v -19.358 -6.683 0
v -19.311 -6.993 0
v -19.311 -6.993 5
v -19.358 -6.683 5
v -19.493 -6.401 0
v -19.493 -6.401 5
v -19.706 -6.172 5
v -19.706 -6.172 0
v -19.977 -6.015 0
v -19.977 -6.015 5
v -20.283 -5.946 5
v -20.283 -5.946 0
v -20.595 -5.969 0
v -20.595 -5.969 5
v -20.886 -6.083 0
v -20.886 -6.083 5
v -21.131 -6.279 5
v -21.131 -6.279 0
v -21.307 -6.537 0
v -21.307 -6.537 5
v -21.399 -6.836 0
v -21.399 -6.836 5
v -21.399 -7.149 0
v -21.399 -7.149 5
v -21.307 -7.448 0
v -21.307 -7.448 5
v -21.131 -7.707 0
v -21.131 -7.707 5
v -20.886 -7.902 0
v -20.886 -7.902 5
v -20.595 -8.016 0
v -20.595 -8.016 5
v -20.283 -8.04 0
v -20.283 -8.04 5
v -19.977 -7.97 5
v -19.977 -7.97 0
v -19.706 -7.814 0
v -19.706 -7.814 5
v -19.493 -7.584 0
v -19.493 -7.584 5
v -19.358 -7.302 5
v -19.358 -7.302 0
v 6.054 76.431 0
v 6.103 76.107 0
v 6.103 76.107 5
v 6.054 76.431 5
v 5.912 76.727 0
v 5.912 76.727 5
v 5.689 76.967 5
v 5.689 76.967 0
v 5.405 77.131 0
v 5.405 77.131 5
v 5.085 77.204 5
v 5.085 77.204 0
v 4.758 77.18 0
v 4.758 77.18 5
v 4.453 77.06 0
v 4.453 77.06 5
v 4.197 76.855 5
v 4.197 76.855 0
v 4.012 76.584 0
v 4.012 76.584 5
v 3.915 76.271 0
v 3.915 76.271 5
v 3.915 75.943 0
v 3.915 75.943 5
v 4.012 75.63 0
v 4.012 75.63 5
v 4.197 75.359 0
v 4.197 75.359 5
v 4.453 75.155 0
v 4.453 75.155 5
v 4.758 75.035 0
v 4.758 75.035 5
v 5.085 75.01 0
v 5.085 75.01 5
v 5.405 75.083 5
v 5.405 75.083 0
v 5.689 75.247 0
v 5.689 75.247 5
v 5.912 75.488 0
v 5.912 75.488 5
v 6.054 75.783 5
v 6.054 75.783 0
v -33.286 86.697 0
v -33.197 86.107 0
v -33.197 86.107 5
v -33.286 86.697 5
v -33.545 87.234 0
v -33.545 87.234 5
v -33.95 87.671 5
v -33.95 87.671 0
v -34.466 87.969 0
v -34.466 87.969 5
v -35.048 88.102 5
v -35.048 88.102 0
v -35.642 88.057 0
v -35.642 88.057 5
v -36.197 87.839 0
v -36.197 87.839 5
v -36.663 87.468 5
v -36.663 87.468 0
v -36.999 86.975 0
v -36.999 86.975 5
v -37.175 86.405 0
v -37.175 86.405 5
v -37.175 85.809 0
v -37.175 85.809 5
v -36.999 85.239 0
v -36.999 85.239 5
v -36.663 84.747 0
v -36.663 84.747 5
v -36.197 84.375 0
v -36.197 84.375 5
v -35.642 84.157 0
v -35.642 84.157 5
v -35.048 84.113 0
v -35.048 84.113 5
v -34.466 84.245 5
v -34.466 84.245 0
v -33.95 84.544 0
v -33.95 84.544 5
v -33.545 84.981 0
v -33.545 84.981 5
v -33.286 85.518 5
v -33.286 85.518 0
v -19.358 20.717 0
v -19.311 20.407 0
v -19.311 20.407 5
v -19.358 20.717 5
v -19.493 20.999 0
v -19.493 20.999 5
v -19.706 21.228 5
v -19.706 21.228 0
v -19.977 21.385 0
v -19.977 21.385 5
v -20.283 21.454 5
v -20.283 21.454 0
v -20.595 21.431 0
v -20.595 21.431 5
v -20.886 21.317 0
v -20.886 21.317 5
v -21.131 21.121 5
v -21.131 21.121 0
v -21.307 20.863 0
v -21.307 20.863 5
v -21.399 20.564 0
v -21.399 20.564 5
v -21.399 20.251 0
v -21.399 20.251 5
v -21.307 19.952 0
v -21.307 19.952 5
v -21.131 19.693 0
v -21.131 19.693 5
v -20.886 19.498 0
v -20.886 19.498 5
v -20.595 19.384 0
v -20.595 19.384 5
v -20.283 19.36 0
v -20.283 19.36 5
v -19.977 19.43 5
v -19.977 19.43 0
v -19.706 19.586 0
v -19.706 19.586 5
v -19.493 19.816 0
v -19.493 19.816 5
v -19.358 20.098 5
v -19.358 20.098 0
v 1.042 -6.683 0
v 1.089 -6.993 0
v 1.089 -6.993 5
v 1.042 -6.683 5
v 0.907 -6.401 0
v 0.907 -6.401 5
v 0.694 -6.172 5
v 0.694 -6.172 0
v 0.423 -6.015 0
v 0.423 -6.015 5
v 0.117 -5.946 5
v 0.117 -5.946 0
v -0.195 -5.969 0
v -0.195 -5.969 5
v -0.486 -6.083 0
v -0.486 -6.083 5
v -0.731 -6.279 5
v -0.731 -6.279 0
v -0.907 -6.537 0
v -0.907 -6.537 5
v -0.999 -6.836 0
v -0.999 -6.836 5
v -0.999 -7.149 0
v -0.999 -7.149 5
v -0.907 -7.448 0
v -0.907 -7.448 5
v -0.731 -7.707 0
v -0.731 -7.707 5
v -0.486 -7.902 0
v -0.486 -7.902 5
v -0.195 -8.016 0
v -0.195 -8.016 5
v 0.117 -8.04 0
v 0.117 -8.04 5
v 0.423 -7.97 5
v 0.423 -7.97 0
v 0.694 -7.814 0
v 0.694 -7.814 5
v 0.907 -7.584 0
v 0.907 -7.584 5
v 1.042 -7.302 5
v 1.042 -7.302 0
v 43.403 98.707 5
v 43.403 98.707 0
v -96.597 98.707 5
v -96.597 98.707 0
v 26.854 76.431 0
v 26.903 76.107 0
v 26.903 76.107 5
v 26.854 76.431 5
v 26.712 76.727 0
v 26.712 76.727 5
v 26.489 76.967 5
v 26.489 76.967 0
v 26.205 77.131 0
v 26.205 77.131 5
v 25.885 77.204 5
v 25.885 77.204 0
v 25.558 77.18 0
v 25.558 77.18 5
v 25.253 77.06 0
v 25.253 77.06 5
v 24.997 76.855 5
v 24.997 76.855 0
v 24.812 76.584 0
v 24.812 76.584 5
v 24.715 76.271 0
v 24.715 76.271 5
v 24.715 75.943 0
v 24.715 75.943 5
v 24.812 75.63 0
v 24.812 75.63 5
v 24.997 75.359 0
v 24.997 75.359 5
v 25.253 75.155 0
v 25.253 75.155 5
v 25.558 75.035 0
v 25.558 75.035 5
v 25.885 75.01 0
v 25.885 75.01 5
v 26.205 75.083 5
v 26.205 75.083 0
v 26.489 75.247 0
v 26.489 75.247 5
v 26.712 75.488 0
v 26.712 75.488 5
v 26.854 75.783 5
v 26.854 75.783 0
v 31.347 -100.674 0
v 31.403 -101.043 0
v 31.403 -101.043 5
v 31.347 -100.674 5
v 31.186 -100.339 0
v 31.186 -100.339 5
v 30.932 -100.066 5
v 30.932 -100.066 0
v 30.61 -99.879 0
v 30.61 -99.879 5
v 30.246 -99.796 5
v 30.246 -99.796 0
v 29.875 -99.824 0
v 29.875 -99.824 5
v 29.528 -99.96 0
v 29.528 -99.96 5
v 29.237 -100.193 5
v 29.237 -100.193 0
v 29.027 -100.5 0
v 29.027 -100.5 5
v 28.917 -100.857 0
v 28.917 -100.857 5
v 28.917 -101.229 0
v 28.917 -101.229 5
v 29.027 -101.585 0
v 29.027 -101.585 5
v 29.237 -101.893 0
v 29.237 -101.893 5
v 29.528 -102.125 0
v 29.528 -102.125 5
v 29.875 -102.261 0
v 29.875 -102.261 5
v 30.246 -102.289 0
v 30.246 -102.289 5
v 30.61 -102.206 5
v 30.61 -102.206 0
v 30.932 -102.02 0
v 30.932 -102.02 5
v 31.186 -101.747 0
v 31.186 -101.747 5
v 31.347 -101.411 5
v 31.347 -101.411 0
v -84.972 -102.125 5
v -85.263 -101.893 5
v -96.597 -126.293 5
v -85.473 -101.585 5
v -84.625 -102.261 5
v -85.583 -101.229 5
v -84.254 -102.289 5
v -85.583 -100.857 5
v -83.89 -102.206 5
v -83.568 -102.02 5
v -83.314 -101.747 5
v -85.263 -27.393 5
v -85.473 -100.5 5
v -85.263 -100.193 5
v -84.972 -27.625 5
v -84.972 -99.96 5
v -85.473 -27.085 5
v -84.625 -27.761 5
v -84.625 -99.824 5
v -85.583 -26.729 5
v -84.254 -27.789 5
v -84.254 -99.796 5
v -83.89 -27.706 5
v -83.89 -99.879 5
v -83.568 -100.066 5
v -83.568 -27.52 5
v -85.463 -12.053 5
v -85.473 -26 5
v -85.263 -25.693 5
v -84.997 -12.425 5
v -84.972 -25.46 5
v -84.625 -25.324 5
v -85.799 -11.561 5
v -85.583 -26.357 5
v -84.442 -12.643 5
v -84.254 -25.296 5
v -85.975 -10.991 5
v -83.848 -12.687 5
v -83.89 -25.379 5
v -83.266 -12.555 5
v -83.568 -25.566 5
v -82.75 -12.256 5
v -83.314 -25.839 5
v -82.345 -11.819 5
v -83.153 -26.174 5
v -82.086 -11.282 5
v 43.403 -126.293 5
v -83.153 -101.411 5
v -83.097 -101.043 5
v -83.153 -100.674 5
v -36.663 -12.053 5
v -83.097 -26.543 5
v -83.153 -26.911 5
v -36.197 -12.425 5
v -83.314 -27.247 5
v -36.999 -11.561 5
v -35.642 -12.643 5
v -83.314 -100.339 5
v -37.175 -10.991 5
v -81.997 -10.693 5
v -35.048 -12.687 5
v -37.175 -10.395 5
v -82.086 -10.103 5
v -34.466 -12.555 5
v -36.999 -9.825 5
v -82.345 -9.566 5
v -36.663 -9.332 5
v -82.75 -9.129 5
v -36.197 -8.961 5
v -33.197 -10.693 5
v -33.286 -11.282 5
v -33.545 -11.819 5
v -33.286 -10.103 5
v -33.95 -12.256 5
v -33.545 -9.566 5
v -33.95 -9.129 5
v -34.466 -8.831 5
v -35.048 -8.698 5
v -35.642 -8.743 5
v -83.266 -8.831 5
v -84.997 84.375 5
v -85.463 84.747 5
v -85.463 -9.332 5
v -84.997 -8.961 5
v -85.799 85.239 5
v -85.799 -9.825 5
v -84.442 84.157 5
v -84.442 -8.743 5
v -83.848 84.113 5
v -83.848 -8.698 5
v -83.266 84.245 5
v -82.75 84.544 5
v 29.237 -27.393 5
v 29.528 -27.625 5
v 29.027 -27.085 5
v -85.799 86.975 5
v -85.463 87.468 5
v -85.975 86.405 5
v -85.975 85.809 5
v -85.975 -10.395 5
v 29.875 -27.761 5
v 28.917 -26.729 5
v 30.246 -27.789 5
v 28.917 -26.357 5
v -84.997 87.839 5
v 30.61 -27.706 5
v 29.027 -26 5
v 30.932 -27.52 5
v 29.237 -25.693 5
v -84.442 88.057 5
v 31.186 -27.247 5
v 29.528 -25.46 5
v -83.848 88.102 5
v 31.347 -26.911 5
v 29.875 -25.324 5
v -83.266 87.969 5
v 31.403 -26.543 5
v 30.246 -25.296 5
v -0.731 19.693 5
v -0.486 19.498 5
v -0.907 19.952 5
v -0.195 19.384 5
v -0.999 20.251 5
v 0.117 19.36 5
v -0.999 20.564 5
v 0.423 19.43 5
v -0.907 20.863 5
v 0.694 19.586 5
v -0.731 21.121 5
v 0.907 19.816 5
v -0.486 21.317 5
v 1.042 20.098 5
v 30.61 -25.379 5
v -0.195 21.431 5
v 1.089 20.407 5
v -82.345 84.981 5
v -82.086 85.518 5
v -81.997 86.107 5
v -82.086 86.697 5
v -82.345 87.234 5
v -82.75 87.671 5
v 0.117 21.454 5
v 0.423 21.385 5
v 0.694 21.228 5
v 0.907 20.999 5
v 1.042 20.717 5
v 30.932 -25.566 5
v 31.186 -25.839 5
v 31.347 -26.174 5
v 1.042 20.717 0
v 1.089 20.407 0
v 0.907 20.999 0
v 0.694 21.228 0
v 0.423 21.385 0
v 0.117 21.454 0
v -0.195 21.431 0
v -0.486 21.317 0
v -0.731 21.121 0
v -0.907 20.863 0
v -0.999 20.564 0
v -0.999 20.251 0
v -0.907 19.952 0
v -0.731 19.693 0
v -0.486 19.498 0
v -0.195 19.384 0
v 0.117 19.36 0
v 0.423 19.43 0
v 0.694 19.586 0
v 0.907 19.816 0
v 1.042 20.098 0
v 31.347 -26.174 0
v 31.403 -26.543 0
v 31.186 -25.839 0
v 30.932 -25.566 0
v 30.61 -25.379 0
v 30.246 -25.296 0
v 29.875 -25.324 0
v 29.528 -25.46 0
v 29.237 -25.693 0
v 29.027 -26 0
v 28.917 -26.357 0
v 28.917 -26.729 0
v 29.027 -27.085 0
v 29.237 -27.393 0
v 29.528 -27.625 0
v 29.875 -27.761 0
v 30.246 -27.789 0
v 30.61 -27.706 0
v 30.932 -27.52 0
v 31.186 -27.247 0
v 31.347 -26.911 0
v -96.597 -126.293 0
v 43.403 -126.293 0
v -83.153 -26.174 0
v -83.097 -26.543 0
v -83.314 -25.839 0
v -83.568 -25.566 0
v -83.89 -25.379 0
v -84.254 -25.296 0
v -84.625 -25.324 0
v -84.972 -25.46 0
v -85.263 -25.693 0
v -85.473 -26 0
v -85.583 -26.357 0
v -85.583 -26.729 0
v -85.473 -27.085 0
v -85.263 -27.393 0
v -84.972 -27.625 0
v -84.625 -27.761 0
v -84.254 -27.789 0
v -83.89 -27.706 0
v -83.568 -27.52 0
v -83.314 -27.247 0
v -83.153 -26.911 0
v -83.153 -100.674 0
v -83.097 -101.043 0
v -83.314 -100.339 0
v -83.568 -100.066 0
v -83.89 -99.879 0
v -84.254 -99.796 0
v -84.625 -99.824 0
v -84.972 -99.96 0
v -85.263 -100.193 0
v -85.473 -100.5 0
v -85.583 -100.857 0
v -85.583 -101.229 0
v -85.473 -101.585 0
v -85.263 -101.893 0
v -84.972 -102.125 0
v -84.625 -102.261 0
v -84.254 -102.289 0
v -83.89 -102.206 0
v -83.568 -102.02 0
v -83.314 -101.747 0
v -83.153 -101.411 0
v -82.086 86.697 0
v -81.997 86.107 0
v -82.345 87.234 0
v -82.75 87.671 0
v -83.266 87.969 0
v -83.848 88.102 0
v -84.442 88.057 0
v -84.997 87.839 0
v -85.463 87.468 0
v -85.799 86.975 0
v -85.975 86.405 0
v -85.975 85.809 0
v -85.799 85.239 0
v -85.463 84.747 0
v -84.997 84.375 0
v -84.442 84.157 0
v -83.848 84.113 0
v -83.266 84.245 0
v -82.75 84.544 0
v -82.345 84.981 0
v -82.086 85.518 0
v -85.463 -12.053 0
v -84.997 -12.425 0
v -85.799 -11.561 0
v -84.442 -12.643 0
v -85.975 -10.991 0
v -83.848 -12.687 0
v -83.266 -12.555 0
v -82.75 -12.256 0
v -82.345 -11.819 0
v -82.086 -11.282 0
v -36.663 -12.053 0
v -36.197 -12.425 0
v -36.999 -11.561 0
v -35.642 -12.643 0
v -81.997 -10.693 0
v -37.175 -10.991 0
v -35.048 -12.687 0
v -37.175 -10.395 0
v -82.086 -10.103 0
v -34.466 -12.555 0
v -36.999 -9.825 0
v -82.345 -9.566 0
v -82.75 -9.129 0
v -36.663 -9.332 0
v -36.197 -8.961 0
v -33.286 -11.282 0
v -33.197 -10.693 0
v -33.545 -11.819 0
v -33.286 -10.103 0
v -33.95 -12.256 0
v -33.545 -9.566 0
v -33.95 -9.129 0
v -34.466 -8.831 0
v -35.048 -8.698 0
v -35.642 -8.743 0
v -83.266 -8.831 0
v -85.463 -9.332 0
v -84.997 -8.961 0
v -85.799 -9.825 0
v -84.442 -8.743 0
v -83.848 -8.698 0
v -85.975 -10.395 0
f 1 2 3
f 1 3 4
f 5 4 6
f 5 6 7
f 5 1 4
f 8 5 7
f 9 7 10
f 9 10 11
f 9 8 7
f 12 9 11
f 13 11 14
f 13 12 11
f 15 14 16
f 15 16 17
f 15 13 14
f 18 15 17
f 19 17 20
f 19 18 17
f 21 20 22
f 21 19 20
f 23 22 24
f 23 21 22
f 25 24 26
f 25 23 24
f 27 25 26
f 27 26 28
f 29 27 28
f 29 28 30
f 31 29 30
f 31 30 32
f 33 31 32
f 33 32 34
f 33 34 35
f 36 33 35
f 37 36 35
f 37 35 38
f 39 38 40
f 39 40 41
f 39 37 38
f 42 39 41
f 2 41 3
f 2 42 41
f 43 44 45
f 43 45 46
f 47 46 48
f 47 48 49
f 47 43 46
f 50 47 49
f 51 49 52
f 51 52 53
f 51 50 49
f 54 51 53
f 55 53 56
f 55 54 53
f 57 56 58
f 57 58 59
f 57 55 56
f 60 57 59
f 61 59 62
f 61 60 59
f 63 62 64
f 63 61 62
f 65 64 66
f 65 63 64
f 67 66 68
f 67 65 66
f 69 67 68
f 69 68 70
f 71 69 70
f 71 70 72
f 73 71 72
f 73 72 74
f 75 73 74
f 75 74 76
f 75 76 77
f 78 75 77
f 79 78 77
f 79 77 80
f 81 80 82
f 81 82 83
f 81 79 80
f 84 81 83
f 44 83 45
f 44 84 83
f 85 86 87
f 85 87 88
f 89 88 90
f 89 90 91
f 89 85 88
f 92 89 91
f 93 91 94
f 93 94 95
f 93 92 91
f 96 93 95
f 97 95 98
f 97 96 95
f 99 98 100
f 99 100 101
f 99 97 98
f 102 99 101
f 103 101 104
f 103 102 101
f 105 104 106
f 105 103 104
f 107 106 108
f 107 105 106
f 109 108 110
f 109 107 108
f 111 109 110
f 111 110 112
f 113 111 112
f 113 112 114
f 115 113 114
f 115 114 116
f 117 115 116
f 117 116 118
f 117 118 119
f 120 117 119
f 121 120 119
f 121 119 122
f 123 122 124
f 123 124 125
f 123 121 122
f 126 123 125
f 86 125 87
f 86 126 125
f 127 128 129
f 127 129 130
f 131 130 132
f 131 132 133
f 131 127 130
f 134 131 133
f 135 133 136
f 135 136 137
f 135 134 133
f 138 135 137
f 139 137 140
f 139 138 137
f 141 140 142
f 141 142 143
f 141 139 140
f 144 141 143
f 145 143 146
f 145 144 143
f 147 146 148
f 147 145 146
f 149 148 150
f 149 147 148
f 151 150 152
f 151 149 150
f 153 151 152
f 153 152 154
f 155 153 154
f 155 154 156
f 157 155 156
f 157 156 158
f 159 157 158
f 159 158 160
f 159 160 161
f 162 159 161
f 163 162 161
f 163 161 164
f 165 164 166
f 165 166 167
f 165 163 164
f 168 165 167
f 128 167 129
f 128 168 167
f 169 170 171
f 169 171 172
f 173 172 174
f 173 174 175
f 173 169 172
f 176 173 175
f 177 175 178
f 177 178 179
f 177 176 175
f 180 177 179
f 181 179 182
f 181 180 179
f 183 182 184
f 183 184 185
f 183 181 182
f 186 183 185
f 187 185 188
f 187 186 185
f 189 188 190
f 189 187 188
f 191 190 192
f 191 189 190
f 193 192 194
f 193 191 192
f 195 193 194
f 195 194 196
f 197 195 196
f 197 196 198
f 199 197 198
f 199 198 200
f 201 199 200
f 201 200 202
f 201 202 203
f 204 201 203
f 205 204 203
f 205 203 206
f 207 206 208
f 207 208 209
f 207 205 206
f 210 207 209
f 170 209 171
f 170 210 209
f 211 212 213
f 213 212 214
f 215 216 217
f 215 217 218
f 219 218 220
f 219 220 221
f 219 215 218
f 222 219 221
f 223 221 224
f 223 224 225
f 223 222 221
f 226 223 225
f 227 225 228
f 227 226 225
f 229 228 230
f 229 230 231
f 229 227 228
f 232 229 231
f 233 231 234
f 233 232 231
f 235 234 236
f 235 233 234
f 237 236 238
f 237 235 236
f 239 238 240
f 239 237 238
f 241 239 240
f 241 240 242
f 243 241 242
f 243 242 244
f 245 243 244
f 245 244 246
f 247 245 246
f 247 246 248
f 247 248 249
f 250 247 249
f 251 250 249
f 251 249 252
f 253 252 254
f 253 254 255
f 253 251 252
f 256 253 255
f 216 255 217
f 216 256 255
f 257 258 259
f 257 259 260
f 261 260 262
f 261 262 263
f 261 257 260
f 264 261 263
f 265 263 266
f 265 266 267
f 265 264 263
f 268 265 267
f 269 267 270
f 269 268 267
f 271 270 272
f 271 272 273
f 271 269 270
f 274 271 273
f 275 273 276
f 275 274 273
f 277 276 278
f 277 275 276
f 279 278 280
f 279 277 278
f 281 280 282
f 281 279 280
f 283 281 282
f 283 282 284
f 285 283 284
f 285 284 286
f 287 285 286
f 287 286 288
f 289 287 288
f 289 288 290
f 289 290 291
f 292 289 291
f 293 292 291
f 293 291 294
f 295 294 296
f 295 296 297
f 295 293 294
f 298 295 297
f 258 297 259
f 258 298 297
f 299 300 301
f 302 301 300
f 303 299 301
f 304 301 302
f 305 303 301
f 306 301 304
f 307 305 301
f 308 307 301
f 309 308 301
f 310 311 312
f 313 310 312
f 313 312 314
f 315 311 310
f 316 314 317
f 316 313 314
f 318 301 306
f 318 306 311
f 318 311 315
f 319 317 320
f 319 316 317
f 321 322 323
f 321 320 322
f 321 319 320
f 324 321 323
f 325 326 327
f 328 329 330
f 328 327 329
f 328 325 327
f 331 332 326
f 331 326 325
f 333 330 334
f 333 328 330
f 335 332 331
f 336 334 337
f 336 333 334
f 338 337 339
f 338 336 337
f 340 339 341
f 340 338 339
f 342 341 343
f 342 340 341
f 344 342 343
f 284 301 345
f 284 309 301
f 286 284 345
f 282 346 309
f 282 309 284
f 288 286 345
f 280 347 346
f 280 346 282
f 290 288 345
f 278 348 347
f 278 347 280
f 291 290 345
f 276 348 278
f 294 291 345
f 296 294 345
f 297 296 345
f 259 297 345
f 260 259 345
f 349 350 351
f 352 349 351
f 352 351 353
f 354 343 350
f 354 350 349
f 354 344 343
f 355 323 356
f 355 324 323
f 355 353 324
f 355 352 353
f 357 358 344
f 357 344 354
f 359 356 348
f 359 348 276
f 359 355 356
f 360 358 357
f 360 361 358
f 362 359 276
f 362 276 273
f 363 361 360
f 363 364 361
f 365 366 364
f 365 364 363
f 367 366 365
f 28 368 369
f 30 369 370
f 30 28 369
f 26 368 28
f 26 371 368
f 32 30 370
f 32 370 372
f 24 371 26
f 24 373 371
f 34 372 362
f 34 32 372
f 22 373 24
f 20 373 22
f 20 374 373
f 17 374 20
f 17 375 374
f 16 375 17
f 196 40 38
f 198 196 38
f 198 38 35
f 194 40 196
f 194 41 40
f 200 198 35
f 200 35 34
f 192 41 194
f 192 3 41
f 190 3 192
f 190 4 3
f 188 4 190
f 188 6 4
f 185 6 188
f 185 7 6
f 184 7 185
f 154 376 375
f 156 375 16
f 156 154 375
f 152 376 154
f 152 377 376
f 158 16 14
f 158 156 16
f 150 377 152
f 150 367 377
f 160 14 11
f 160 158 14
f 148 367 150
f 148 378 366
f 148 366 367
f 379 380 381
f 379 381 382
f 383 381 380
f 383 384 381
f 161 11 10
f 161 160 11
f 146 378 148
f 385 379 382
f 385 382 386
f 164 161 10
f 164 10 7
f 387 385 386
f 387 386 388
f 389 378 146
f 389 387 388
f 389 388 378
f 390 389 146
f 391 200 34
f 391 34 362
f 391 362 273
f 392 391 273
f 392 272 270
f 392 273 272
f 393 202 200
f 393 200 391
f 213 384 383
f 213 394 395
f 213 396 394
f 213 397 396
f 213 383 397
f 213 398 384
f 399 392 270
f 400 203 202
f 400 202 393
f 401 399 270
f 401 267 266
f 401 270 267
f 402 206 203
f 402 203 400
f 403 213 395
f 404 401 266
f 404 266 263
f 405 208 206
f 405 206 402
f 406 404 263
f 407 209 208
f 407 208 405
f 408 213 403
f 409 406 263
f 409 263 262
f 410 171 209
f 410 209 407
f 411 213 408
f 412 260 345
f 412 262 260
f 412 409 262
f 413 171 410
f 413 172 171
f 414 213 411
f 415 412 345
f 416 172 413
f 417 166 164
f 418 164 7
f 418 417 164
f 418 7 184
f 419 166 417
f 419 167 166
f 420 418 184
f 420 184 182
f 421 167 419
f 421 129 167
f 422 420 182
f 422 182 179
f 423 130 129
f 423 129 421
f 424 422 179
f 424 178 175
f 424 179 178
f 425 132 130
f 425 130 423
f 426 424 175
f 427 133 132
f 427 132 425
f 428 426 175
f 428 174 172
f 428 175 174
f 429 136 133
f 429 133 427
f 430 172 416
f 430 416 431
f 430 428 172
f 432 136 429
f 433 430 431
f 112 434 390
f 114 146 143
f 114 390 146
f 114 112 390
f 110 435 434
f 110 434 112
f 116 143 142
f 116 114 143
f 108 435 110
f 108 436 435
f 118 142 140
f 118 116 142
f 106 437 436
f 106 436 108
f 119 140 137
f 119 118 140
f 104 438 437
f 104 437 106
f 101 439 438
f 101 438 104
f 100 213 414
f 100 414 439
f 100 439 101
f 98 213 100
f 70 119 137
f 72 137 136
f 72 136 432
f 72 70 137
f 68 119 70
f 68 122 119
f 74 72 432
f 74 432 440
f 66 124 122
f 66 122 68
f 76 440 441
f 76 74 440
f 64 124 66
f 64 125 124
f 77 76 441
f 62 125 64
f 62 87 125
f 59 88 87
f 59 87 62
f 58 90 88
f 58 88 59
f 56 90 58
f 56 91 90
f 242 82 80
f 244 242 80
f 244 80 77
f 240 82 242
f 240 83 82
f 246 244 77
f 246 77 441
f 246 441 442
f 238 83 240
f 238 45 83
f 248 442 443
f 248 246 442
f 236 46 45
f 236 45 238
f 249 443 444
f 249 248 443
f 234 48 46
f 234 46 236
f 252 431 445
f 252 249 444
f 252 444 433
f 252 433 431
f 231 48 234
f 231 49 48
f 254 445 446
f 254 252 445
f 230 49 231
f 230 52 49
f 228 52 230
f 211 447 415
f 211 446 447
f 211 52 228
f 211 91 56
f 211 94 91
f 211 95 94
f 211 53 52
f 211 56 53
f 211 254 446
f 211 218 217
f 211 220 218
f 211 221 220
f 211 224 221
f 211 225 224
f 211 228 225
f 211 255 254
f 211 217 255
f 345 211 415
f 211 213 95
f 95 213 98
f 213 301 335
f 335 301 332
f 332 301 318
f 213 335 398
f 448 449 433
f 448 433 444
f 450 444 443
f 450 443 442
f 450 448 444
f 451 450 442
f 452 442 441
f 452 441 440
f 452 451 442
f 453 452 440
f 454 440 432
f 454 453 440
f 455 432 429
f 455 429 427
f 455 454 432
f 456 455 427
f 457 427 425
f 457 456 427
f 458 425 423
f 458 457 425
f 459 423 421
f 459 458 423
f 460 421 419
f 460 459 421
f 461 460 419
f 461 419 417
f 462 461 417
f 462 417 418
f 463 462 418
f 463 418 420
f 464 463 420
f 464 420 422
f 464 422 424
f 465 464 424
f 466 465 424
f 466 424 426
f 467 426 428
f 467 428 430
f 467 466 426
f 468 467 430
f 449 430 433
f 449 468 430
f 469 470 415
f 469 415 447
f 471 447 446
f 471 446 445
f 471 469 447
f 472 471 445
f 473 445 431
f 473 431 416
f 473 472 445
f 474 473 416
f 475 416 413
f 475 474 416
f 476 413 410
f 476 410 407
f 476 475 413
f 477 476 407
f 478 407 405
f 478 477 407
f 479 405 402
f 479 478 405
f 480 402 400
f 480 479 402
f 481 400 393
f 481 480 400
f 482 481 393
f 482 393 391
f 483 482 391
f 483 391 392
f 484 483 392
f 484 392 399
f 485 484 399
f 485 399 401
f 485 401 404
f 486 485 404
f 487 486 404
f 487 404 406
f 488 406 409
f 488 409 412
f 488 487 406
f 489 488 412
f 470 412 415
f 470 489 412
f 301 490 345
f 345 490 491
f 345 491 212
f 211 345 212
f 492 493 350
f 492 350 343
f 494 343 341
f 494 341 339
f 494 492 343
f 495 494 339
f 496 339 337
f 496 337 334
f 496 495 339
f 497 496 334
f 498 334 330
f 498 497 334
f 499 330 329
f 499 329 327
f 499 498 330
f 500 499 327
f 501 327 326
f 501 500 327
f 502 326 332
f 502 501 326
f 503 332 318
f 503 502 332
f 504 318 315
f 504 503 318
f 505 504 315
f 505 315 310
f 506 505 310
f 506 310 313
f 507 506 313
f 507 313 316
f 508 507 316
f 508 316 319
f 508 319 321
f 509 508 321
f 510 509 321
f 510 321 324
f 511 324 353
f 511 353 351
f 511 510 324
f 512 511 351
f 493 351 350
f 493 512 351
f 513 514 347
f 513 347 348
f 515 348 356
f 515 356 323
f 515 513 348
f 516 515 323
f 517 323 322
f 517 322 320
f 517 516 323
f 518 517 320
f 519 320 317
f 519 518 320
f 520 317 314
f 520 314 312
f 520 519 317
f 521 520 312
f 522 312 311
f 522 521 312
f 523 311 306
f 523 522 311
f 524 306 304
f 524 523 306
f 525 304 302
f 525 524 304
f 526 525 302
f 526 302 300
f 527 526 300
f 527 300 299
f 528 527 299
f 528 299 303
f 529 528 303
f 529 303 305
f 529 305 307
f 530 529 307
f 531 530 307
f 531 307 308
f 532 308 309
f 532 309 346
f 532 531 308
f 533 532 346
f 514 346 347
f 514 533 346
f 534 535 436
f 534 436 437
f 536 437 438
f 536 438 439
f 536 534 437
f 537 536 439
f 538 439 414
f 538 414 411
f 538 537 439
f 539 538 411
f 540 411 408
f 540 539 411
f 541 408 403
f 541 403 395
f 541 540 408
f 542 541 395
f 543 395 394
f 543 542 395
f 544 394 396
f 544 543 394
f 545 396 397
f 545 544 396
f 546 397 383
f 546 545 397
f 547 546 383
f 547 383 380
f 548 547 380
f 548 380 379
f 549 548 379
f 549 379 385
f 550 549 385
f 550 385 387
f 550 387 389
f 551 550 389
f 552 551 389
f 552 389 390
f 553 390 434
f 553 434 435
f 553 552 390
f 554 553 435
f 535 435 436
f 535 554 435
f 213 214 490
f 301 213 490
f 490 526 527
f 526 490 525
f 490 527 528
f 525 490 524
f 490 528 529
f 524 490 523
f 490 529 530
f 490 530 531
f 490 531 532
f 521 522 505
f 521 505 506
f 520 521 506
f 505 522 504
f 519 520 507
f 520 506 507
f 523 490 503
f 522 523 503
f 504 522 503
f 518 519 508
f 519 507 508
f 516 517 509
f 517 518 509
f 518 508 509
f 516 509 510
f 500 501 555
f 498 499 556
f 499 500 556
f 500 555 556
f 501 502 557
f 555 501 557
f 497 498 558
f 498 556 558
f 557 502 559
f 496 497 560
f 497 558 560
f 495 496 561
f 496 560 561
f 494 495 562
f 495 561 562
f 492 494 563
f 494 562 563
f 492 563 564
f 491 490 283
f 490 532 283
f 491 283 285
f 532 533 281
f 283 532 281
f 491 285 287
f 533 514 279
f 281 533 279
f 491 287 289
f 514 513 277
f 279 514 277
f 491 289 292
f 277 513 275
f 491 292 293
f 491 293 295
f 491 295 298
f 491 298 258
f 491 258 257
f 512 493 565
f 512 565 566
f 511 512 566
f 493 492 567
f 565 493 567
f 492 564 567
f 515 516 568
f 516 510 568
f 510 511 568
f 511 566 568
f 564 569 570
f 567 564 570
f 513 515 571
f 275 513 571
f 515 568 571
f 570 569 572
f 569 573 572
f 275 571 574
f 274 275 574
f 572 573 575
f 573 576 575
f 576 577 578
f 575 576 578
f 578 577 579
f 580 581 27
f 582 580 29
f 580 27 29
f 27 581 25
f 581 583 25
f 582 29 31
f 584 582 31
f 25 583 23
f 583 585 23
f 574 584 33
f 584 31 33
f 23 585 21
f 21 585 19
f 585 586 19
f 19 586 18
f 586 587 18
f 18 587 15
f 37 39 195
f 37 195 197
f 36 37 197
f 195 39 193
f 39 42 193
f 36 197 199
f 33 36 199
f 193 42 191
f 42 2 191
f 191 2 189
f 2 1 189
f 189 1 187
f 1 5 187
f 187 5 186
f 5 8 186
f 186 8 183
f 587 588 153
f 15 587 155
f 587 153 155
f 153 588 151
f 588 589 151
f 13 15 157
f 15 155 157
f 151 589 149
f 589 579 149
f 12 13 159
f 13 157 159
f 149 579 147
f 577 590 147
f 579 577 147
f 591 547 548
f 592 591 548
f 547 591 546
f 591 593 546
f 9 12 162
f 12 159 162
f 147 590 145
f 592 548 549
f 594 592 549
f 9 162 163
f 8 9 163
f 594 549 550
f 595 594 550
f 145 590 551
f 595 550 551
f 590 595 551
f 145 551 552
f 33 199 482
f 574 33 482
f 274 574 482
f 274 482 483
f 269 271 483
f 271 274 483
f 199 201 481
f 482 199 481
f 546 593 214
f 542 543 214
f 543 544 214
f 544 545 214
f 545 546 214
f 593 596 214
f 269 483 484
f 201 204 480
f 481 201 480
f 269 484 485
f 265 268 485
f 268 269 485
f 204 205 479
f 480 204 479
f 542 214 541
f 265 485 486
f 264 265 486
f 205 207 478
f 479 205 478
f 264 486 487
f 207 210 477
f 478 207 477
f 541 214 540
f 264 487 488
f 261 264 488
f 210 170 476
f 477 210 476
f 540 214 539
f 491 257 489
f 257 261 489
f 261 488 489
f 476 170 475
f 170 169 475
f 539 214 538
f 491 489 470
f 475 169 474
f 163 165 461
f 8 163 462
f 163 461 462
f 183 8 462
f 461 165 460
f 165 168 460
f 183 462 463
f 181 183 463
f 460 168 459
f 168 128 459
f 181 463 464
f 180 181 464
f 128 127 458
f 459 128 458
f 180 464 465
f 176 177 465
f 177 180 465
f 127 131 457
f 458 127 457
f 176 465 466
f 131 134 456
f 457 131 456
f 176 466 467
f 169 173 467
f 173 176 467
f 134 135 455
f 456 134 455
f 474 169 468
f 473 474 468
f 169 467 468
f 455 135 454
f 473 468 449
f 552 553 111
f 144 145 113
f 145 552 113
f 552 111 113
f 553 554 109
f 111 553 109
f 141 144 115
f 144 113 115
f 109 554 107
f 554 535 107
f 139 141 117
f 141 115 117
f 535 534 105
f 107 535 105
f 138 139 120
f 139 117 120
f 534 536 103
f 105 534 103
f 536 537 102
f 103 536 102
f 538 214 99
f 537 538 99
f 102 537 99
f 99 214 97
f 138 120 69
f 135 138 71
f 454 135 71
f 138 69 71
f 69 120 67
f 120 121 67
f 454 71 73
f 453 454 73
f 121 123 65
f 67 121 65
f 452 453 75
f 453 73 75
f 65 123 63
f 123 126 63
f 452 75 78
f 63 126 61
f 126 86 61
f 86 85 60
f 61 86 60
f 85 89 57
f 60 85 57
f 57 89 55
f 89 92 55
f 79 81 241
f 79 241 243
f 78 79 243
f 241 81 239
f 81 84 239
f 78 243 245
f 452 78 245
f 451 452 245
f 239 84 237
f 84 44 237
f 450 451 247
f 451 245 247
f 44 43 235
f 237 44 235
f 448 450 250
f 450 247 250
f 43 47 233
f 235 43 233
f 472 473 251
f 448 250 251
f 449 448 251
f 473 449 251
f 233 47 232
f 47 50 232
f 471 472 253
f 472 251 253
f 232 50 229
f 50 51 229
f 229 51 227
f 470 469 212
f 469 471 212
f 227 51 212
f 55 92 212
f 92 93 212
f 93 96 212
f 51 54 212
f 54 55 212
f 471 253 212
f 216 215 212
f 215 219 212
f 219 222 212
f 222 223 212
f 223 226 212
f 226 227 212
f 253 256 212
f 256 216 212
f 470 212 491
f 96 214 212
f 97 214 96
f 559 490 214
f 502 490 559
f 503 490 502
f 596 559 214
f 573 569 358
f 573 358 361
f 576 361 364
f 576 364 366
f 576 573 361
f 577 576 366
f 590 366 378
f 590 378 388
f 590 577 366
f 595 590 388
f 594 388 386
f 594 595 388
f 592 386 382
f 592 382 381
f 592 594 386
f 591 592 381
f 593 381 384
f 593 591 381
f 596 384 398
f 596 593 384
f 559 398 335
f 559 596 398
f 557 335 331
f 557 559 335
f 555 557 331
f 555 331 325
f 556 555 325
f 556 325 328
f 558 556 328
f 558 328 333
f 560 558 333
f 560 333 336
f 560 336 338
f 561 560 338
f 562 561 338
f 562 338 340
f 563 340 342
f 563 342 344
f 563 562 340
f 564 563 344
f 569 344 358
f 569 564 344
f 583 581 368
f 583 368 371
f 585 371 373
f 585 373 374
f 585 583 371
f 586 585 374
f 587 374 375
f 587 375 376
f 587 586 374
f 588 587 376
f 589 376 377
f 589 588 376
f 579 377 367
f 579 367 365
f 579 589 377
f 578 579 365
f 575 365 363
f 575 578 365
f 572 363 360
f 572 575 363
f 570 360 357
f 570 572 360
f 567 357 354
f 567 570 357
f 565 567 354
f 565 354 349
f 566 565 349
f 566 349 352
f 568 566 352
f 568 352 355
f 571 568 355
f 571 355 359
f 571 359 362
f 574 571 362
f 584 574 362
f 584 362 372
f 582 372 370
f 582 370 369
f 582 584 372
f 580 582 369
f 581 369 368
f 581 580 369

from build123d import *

# Parameters (mm, degrees)
F0_R     = 1.25
F0_W     = 26
F0_H     = 35.5
F0_R_2   = 2
F0_R_3   = 1.05
F0_W_2   = 15
F0_H_2   = 10
F0_R_4   = 1.1
F0_W_3   = 10
F0_H_3   = 20
F0_W_4   = 45
F1_DEPTH = 5


with BuildPart() as f1:
    # F0 (on Top) → F1 (new body)
    with BuildSketch(Plane.XY):
        Polygon((33.40298, -104.292824), (33.40298, -43.292824), (33.40298, -23.292824), (-87.59702, -23.292824), (-87.59702, -104.292824), align=None)
        with Locations((-84.34702, -101.042824)):
            Circle(F0_R, mode=Mode.SUBTRACT)
        with Locations((-84.34702, -26.542824)):
            Circle(F0_R, mode=Mode.SUBTRACT)
        with Locations((30.15298, -101.042824)):
            Circle(F0_R, mode=Mode.SUBTRACT)
        with Locations((30.15298, -26.542824)):
            Circle(F0_R, mode=Mode.SUBTRACT)
        Polygon((-81.59702, 98.707176), (-96.59702, 98.707176), (-96.59702, -126.292824), (43.40298, -126.292824), (43.40298, -43.292824), (33.40298, -43.292824), (33.40298, -104.292824), (-87.59702, -104.292824), (-87.59702, -23.292824), (33.40298, -23.292824), (43.40298, -23.292824), (43.40298, 98.707176), (-36.59702, 98.707176), (-36.59702, 88.707176), (-35.19702, 88.707176), (-32.59702, 88.707176), (-32.59702, 86.107176), (-32.59702, -10.692824), (-32.59702, -13.292824), (-35.19702, -13.292824), (-83.99702, -13.292824), (-86.59702, -13.292824), (-86.59702, -10.692824), (-86.59702, 86.107176), (-86.59702, 86.507176), (-86.59702, 88.707176), (-84.39702, 88.707176), (-83.99702, 88.707176), (-81.59702, 88.707176), align=None)
        Polygon((-23.161016, -9.792824), (-23.161016, 23.207176), (-17.161016, 23.207176), (-17.161016, 33.207176), (-2.161016, 33.207176), (-2.161016, 23.207176), (2.838984, 23.207176), (2.838984, -9.792824), align=None, mode=Mode.SUBTRACT)
        with Locations((15.40298, 60.957176)):
            Rectangle(F0_W, F0_H, mode=Mode.SUBTRACT)
        Polygon((-36.59702, 88.707176), (-81.59702, 88.707176), (-83.99702, 88.707176), (-84.39702, 88.707176), (-86.59702, 88.707176), (-86.59702, 86.507176), (-86.59702, 86.107176), (-86.59702, -10.692824), (-86.59702, -13.292824), (-83.99702, -13.292824), (-35.19702, -13.292824), (-32.59702, -13.292824), (-32.59702, -10.692824), (-32.59702, 86.107176), (-32.59702, 88.707176), (-35.19702, 88.707176), align=None)
        with Locations((-83.99702, -10.692824)):
            Circle(F0_R_2, mode=Mode.SUBTRACT)
        with Locations((-35.19702, -10.692824)):
            Circle(F0_R_2, mode=Mode.SUBTRACT)
        with Locations((-83.99702, 86.107176)):
            Circle(F0_R_2, mode=Mode.SUBTRACT)
        with Locations((-35.19702, 86.107176)):
            Circle(F0_R_2, mode=Mode.SUBTRACT)
        Polygon((-17.161016, 23.207176), (-23.161016, 23.207176), (-23.161016, -9.792824), (2.838984, -9.792824), (2.838984, 23.207176), (-2.161016, 23.207176), align=None)
        with Locations((-20.361016, -6.992824)):
            Circle(F0_R_3, mode=Mode.SUBTRACT)
        with Locations((0.038984, -6.992824)):
            Circle(F0_R_3, mode=Mode.SUBTRACT)
        with Locations((-20.361016, 20.407176)):
            Circle(F0_R_3, mode=Mode.SUBTRACT)
        with Locations((0.038984, 20.407176)):
            Circle(F0_R_3, mode=Mode.SUBTRACT)
        with Locations((-9.661016, 28.207176)):
            Rectangle(F0_W_2, F0_H_2)
        with Locations((15.40298, 60.957176)):
            Rectangle(F0_W, F0_H)
        with Locations((5.00298, 76.107176)):
            Circle(F0_R_4, mode=Mode.SUBTRACT)
        with Locations((25.80298, 76.107176)):
            Circle(F0_R_4, mode=Mode.SUBTRACT)
        with Locations((38.40298, -33.292824)):
            Rectangle(F0_W_3, F0_H_3)
        with Locations((-59.09702, 93.707176)):
            Rectangle(F0_W_4, F0_H_2)
    extrude(amount=F1_DEPTH)


solid = f1.part
